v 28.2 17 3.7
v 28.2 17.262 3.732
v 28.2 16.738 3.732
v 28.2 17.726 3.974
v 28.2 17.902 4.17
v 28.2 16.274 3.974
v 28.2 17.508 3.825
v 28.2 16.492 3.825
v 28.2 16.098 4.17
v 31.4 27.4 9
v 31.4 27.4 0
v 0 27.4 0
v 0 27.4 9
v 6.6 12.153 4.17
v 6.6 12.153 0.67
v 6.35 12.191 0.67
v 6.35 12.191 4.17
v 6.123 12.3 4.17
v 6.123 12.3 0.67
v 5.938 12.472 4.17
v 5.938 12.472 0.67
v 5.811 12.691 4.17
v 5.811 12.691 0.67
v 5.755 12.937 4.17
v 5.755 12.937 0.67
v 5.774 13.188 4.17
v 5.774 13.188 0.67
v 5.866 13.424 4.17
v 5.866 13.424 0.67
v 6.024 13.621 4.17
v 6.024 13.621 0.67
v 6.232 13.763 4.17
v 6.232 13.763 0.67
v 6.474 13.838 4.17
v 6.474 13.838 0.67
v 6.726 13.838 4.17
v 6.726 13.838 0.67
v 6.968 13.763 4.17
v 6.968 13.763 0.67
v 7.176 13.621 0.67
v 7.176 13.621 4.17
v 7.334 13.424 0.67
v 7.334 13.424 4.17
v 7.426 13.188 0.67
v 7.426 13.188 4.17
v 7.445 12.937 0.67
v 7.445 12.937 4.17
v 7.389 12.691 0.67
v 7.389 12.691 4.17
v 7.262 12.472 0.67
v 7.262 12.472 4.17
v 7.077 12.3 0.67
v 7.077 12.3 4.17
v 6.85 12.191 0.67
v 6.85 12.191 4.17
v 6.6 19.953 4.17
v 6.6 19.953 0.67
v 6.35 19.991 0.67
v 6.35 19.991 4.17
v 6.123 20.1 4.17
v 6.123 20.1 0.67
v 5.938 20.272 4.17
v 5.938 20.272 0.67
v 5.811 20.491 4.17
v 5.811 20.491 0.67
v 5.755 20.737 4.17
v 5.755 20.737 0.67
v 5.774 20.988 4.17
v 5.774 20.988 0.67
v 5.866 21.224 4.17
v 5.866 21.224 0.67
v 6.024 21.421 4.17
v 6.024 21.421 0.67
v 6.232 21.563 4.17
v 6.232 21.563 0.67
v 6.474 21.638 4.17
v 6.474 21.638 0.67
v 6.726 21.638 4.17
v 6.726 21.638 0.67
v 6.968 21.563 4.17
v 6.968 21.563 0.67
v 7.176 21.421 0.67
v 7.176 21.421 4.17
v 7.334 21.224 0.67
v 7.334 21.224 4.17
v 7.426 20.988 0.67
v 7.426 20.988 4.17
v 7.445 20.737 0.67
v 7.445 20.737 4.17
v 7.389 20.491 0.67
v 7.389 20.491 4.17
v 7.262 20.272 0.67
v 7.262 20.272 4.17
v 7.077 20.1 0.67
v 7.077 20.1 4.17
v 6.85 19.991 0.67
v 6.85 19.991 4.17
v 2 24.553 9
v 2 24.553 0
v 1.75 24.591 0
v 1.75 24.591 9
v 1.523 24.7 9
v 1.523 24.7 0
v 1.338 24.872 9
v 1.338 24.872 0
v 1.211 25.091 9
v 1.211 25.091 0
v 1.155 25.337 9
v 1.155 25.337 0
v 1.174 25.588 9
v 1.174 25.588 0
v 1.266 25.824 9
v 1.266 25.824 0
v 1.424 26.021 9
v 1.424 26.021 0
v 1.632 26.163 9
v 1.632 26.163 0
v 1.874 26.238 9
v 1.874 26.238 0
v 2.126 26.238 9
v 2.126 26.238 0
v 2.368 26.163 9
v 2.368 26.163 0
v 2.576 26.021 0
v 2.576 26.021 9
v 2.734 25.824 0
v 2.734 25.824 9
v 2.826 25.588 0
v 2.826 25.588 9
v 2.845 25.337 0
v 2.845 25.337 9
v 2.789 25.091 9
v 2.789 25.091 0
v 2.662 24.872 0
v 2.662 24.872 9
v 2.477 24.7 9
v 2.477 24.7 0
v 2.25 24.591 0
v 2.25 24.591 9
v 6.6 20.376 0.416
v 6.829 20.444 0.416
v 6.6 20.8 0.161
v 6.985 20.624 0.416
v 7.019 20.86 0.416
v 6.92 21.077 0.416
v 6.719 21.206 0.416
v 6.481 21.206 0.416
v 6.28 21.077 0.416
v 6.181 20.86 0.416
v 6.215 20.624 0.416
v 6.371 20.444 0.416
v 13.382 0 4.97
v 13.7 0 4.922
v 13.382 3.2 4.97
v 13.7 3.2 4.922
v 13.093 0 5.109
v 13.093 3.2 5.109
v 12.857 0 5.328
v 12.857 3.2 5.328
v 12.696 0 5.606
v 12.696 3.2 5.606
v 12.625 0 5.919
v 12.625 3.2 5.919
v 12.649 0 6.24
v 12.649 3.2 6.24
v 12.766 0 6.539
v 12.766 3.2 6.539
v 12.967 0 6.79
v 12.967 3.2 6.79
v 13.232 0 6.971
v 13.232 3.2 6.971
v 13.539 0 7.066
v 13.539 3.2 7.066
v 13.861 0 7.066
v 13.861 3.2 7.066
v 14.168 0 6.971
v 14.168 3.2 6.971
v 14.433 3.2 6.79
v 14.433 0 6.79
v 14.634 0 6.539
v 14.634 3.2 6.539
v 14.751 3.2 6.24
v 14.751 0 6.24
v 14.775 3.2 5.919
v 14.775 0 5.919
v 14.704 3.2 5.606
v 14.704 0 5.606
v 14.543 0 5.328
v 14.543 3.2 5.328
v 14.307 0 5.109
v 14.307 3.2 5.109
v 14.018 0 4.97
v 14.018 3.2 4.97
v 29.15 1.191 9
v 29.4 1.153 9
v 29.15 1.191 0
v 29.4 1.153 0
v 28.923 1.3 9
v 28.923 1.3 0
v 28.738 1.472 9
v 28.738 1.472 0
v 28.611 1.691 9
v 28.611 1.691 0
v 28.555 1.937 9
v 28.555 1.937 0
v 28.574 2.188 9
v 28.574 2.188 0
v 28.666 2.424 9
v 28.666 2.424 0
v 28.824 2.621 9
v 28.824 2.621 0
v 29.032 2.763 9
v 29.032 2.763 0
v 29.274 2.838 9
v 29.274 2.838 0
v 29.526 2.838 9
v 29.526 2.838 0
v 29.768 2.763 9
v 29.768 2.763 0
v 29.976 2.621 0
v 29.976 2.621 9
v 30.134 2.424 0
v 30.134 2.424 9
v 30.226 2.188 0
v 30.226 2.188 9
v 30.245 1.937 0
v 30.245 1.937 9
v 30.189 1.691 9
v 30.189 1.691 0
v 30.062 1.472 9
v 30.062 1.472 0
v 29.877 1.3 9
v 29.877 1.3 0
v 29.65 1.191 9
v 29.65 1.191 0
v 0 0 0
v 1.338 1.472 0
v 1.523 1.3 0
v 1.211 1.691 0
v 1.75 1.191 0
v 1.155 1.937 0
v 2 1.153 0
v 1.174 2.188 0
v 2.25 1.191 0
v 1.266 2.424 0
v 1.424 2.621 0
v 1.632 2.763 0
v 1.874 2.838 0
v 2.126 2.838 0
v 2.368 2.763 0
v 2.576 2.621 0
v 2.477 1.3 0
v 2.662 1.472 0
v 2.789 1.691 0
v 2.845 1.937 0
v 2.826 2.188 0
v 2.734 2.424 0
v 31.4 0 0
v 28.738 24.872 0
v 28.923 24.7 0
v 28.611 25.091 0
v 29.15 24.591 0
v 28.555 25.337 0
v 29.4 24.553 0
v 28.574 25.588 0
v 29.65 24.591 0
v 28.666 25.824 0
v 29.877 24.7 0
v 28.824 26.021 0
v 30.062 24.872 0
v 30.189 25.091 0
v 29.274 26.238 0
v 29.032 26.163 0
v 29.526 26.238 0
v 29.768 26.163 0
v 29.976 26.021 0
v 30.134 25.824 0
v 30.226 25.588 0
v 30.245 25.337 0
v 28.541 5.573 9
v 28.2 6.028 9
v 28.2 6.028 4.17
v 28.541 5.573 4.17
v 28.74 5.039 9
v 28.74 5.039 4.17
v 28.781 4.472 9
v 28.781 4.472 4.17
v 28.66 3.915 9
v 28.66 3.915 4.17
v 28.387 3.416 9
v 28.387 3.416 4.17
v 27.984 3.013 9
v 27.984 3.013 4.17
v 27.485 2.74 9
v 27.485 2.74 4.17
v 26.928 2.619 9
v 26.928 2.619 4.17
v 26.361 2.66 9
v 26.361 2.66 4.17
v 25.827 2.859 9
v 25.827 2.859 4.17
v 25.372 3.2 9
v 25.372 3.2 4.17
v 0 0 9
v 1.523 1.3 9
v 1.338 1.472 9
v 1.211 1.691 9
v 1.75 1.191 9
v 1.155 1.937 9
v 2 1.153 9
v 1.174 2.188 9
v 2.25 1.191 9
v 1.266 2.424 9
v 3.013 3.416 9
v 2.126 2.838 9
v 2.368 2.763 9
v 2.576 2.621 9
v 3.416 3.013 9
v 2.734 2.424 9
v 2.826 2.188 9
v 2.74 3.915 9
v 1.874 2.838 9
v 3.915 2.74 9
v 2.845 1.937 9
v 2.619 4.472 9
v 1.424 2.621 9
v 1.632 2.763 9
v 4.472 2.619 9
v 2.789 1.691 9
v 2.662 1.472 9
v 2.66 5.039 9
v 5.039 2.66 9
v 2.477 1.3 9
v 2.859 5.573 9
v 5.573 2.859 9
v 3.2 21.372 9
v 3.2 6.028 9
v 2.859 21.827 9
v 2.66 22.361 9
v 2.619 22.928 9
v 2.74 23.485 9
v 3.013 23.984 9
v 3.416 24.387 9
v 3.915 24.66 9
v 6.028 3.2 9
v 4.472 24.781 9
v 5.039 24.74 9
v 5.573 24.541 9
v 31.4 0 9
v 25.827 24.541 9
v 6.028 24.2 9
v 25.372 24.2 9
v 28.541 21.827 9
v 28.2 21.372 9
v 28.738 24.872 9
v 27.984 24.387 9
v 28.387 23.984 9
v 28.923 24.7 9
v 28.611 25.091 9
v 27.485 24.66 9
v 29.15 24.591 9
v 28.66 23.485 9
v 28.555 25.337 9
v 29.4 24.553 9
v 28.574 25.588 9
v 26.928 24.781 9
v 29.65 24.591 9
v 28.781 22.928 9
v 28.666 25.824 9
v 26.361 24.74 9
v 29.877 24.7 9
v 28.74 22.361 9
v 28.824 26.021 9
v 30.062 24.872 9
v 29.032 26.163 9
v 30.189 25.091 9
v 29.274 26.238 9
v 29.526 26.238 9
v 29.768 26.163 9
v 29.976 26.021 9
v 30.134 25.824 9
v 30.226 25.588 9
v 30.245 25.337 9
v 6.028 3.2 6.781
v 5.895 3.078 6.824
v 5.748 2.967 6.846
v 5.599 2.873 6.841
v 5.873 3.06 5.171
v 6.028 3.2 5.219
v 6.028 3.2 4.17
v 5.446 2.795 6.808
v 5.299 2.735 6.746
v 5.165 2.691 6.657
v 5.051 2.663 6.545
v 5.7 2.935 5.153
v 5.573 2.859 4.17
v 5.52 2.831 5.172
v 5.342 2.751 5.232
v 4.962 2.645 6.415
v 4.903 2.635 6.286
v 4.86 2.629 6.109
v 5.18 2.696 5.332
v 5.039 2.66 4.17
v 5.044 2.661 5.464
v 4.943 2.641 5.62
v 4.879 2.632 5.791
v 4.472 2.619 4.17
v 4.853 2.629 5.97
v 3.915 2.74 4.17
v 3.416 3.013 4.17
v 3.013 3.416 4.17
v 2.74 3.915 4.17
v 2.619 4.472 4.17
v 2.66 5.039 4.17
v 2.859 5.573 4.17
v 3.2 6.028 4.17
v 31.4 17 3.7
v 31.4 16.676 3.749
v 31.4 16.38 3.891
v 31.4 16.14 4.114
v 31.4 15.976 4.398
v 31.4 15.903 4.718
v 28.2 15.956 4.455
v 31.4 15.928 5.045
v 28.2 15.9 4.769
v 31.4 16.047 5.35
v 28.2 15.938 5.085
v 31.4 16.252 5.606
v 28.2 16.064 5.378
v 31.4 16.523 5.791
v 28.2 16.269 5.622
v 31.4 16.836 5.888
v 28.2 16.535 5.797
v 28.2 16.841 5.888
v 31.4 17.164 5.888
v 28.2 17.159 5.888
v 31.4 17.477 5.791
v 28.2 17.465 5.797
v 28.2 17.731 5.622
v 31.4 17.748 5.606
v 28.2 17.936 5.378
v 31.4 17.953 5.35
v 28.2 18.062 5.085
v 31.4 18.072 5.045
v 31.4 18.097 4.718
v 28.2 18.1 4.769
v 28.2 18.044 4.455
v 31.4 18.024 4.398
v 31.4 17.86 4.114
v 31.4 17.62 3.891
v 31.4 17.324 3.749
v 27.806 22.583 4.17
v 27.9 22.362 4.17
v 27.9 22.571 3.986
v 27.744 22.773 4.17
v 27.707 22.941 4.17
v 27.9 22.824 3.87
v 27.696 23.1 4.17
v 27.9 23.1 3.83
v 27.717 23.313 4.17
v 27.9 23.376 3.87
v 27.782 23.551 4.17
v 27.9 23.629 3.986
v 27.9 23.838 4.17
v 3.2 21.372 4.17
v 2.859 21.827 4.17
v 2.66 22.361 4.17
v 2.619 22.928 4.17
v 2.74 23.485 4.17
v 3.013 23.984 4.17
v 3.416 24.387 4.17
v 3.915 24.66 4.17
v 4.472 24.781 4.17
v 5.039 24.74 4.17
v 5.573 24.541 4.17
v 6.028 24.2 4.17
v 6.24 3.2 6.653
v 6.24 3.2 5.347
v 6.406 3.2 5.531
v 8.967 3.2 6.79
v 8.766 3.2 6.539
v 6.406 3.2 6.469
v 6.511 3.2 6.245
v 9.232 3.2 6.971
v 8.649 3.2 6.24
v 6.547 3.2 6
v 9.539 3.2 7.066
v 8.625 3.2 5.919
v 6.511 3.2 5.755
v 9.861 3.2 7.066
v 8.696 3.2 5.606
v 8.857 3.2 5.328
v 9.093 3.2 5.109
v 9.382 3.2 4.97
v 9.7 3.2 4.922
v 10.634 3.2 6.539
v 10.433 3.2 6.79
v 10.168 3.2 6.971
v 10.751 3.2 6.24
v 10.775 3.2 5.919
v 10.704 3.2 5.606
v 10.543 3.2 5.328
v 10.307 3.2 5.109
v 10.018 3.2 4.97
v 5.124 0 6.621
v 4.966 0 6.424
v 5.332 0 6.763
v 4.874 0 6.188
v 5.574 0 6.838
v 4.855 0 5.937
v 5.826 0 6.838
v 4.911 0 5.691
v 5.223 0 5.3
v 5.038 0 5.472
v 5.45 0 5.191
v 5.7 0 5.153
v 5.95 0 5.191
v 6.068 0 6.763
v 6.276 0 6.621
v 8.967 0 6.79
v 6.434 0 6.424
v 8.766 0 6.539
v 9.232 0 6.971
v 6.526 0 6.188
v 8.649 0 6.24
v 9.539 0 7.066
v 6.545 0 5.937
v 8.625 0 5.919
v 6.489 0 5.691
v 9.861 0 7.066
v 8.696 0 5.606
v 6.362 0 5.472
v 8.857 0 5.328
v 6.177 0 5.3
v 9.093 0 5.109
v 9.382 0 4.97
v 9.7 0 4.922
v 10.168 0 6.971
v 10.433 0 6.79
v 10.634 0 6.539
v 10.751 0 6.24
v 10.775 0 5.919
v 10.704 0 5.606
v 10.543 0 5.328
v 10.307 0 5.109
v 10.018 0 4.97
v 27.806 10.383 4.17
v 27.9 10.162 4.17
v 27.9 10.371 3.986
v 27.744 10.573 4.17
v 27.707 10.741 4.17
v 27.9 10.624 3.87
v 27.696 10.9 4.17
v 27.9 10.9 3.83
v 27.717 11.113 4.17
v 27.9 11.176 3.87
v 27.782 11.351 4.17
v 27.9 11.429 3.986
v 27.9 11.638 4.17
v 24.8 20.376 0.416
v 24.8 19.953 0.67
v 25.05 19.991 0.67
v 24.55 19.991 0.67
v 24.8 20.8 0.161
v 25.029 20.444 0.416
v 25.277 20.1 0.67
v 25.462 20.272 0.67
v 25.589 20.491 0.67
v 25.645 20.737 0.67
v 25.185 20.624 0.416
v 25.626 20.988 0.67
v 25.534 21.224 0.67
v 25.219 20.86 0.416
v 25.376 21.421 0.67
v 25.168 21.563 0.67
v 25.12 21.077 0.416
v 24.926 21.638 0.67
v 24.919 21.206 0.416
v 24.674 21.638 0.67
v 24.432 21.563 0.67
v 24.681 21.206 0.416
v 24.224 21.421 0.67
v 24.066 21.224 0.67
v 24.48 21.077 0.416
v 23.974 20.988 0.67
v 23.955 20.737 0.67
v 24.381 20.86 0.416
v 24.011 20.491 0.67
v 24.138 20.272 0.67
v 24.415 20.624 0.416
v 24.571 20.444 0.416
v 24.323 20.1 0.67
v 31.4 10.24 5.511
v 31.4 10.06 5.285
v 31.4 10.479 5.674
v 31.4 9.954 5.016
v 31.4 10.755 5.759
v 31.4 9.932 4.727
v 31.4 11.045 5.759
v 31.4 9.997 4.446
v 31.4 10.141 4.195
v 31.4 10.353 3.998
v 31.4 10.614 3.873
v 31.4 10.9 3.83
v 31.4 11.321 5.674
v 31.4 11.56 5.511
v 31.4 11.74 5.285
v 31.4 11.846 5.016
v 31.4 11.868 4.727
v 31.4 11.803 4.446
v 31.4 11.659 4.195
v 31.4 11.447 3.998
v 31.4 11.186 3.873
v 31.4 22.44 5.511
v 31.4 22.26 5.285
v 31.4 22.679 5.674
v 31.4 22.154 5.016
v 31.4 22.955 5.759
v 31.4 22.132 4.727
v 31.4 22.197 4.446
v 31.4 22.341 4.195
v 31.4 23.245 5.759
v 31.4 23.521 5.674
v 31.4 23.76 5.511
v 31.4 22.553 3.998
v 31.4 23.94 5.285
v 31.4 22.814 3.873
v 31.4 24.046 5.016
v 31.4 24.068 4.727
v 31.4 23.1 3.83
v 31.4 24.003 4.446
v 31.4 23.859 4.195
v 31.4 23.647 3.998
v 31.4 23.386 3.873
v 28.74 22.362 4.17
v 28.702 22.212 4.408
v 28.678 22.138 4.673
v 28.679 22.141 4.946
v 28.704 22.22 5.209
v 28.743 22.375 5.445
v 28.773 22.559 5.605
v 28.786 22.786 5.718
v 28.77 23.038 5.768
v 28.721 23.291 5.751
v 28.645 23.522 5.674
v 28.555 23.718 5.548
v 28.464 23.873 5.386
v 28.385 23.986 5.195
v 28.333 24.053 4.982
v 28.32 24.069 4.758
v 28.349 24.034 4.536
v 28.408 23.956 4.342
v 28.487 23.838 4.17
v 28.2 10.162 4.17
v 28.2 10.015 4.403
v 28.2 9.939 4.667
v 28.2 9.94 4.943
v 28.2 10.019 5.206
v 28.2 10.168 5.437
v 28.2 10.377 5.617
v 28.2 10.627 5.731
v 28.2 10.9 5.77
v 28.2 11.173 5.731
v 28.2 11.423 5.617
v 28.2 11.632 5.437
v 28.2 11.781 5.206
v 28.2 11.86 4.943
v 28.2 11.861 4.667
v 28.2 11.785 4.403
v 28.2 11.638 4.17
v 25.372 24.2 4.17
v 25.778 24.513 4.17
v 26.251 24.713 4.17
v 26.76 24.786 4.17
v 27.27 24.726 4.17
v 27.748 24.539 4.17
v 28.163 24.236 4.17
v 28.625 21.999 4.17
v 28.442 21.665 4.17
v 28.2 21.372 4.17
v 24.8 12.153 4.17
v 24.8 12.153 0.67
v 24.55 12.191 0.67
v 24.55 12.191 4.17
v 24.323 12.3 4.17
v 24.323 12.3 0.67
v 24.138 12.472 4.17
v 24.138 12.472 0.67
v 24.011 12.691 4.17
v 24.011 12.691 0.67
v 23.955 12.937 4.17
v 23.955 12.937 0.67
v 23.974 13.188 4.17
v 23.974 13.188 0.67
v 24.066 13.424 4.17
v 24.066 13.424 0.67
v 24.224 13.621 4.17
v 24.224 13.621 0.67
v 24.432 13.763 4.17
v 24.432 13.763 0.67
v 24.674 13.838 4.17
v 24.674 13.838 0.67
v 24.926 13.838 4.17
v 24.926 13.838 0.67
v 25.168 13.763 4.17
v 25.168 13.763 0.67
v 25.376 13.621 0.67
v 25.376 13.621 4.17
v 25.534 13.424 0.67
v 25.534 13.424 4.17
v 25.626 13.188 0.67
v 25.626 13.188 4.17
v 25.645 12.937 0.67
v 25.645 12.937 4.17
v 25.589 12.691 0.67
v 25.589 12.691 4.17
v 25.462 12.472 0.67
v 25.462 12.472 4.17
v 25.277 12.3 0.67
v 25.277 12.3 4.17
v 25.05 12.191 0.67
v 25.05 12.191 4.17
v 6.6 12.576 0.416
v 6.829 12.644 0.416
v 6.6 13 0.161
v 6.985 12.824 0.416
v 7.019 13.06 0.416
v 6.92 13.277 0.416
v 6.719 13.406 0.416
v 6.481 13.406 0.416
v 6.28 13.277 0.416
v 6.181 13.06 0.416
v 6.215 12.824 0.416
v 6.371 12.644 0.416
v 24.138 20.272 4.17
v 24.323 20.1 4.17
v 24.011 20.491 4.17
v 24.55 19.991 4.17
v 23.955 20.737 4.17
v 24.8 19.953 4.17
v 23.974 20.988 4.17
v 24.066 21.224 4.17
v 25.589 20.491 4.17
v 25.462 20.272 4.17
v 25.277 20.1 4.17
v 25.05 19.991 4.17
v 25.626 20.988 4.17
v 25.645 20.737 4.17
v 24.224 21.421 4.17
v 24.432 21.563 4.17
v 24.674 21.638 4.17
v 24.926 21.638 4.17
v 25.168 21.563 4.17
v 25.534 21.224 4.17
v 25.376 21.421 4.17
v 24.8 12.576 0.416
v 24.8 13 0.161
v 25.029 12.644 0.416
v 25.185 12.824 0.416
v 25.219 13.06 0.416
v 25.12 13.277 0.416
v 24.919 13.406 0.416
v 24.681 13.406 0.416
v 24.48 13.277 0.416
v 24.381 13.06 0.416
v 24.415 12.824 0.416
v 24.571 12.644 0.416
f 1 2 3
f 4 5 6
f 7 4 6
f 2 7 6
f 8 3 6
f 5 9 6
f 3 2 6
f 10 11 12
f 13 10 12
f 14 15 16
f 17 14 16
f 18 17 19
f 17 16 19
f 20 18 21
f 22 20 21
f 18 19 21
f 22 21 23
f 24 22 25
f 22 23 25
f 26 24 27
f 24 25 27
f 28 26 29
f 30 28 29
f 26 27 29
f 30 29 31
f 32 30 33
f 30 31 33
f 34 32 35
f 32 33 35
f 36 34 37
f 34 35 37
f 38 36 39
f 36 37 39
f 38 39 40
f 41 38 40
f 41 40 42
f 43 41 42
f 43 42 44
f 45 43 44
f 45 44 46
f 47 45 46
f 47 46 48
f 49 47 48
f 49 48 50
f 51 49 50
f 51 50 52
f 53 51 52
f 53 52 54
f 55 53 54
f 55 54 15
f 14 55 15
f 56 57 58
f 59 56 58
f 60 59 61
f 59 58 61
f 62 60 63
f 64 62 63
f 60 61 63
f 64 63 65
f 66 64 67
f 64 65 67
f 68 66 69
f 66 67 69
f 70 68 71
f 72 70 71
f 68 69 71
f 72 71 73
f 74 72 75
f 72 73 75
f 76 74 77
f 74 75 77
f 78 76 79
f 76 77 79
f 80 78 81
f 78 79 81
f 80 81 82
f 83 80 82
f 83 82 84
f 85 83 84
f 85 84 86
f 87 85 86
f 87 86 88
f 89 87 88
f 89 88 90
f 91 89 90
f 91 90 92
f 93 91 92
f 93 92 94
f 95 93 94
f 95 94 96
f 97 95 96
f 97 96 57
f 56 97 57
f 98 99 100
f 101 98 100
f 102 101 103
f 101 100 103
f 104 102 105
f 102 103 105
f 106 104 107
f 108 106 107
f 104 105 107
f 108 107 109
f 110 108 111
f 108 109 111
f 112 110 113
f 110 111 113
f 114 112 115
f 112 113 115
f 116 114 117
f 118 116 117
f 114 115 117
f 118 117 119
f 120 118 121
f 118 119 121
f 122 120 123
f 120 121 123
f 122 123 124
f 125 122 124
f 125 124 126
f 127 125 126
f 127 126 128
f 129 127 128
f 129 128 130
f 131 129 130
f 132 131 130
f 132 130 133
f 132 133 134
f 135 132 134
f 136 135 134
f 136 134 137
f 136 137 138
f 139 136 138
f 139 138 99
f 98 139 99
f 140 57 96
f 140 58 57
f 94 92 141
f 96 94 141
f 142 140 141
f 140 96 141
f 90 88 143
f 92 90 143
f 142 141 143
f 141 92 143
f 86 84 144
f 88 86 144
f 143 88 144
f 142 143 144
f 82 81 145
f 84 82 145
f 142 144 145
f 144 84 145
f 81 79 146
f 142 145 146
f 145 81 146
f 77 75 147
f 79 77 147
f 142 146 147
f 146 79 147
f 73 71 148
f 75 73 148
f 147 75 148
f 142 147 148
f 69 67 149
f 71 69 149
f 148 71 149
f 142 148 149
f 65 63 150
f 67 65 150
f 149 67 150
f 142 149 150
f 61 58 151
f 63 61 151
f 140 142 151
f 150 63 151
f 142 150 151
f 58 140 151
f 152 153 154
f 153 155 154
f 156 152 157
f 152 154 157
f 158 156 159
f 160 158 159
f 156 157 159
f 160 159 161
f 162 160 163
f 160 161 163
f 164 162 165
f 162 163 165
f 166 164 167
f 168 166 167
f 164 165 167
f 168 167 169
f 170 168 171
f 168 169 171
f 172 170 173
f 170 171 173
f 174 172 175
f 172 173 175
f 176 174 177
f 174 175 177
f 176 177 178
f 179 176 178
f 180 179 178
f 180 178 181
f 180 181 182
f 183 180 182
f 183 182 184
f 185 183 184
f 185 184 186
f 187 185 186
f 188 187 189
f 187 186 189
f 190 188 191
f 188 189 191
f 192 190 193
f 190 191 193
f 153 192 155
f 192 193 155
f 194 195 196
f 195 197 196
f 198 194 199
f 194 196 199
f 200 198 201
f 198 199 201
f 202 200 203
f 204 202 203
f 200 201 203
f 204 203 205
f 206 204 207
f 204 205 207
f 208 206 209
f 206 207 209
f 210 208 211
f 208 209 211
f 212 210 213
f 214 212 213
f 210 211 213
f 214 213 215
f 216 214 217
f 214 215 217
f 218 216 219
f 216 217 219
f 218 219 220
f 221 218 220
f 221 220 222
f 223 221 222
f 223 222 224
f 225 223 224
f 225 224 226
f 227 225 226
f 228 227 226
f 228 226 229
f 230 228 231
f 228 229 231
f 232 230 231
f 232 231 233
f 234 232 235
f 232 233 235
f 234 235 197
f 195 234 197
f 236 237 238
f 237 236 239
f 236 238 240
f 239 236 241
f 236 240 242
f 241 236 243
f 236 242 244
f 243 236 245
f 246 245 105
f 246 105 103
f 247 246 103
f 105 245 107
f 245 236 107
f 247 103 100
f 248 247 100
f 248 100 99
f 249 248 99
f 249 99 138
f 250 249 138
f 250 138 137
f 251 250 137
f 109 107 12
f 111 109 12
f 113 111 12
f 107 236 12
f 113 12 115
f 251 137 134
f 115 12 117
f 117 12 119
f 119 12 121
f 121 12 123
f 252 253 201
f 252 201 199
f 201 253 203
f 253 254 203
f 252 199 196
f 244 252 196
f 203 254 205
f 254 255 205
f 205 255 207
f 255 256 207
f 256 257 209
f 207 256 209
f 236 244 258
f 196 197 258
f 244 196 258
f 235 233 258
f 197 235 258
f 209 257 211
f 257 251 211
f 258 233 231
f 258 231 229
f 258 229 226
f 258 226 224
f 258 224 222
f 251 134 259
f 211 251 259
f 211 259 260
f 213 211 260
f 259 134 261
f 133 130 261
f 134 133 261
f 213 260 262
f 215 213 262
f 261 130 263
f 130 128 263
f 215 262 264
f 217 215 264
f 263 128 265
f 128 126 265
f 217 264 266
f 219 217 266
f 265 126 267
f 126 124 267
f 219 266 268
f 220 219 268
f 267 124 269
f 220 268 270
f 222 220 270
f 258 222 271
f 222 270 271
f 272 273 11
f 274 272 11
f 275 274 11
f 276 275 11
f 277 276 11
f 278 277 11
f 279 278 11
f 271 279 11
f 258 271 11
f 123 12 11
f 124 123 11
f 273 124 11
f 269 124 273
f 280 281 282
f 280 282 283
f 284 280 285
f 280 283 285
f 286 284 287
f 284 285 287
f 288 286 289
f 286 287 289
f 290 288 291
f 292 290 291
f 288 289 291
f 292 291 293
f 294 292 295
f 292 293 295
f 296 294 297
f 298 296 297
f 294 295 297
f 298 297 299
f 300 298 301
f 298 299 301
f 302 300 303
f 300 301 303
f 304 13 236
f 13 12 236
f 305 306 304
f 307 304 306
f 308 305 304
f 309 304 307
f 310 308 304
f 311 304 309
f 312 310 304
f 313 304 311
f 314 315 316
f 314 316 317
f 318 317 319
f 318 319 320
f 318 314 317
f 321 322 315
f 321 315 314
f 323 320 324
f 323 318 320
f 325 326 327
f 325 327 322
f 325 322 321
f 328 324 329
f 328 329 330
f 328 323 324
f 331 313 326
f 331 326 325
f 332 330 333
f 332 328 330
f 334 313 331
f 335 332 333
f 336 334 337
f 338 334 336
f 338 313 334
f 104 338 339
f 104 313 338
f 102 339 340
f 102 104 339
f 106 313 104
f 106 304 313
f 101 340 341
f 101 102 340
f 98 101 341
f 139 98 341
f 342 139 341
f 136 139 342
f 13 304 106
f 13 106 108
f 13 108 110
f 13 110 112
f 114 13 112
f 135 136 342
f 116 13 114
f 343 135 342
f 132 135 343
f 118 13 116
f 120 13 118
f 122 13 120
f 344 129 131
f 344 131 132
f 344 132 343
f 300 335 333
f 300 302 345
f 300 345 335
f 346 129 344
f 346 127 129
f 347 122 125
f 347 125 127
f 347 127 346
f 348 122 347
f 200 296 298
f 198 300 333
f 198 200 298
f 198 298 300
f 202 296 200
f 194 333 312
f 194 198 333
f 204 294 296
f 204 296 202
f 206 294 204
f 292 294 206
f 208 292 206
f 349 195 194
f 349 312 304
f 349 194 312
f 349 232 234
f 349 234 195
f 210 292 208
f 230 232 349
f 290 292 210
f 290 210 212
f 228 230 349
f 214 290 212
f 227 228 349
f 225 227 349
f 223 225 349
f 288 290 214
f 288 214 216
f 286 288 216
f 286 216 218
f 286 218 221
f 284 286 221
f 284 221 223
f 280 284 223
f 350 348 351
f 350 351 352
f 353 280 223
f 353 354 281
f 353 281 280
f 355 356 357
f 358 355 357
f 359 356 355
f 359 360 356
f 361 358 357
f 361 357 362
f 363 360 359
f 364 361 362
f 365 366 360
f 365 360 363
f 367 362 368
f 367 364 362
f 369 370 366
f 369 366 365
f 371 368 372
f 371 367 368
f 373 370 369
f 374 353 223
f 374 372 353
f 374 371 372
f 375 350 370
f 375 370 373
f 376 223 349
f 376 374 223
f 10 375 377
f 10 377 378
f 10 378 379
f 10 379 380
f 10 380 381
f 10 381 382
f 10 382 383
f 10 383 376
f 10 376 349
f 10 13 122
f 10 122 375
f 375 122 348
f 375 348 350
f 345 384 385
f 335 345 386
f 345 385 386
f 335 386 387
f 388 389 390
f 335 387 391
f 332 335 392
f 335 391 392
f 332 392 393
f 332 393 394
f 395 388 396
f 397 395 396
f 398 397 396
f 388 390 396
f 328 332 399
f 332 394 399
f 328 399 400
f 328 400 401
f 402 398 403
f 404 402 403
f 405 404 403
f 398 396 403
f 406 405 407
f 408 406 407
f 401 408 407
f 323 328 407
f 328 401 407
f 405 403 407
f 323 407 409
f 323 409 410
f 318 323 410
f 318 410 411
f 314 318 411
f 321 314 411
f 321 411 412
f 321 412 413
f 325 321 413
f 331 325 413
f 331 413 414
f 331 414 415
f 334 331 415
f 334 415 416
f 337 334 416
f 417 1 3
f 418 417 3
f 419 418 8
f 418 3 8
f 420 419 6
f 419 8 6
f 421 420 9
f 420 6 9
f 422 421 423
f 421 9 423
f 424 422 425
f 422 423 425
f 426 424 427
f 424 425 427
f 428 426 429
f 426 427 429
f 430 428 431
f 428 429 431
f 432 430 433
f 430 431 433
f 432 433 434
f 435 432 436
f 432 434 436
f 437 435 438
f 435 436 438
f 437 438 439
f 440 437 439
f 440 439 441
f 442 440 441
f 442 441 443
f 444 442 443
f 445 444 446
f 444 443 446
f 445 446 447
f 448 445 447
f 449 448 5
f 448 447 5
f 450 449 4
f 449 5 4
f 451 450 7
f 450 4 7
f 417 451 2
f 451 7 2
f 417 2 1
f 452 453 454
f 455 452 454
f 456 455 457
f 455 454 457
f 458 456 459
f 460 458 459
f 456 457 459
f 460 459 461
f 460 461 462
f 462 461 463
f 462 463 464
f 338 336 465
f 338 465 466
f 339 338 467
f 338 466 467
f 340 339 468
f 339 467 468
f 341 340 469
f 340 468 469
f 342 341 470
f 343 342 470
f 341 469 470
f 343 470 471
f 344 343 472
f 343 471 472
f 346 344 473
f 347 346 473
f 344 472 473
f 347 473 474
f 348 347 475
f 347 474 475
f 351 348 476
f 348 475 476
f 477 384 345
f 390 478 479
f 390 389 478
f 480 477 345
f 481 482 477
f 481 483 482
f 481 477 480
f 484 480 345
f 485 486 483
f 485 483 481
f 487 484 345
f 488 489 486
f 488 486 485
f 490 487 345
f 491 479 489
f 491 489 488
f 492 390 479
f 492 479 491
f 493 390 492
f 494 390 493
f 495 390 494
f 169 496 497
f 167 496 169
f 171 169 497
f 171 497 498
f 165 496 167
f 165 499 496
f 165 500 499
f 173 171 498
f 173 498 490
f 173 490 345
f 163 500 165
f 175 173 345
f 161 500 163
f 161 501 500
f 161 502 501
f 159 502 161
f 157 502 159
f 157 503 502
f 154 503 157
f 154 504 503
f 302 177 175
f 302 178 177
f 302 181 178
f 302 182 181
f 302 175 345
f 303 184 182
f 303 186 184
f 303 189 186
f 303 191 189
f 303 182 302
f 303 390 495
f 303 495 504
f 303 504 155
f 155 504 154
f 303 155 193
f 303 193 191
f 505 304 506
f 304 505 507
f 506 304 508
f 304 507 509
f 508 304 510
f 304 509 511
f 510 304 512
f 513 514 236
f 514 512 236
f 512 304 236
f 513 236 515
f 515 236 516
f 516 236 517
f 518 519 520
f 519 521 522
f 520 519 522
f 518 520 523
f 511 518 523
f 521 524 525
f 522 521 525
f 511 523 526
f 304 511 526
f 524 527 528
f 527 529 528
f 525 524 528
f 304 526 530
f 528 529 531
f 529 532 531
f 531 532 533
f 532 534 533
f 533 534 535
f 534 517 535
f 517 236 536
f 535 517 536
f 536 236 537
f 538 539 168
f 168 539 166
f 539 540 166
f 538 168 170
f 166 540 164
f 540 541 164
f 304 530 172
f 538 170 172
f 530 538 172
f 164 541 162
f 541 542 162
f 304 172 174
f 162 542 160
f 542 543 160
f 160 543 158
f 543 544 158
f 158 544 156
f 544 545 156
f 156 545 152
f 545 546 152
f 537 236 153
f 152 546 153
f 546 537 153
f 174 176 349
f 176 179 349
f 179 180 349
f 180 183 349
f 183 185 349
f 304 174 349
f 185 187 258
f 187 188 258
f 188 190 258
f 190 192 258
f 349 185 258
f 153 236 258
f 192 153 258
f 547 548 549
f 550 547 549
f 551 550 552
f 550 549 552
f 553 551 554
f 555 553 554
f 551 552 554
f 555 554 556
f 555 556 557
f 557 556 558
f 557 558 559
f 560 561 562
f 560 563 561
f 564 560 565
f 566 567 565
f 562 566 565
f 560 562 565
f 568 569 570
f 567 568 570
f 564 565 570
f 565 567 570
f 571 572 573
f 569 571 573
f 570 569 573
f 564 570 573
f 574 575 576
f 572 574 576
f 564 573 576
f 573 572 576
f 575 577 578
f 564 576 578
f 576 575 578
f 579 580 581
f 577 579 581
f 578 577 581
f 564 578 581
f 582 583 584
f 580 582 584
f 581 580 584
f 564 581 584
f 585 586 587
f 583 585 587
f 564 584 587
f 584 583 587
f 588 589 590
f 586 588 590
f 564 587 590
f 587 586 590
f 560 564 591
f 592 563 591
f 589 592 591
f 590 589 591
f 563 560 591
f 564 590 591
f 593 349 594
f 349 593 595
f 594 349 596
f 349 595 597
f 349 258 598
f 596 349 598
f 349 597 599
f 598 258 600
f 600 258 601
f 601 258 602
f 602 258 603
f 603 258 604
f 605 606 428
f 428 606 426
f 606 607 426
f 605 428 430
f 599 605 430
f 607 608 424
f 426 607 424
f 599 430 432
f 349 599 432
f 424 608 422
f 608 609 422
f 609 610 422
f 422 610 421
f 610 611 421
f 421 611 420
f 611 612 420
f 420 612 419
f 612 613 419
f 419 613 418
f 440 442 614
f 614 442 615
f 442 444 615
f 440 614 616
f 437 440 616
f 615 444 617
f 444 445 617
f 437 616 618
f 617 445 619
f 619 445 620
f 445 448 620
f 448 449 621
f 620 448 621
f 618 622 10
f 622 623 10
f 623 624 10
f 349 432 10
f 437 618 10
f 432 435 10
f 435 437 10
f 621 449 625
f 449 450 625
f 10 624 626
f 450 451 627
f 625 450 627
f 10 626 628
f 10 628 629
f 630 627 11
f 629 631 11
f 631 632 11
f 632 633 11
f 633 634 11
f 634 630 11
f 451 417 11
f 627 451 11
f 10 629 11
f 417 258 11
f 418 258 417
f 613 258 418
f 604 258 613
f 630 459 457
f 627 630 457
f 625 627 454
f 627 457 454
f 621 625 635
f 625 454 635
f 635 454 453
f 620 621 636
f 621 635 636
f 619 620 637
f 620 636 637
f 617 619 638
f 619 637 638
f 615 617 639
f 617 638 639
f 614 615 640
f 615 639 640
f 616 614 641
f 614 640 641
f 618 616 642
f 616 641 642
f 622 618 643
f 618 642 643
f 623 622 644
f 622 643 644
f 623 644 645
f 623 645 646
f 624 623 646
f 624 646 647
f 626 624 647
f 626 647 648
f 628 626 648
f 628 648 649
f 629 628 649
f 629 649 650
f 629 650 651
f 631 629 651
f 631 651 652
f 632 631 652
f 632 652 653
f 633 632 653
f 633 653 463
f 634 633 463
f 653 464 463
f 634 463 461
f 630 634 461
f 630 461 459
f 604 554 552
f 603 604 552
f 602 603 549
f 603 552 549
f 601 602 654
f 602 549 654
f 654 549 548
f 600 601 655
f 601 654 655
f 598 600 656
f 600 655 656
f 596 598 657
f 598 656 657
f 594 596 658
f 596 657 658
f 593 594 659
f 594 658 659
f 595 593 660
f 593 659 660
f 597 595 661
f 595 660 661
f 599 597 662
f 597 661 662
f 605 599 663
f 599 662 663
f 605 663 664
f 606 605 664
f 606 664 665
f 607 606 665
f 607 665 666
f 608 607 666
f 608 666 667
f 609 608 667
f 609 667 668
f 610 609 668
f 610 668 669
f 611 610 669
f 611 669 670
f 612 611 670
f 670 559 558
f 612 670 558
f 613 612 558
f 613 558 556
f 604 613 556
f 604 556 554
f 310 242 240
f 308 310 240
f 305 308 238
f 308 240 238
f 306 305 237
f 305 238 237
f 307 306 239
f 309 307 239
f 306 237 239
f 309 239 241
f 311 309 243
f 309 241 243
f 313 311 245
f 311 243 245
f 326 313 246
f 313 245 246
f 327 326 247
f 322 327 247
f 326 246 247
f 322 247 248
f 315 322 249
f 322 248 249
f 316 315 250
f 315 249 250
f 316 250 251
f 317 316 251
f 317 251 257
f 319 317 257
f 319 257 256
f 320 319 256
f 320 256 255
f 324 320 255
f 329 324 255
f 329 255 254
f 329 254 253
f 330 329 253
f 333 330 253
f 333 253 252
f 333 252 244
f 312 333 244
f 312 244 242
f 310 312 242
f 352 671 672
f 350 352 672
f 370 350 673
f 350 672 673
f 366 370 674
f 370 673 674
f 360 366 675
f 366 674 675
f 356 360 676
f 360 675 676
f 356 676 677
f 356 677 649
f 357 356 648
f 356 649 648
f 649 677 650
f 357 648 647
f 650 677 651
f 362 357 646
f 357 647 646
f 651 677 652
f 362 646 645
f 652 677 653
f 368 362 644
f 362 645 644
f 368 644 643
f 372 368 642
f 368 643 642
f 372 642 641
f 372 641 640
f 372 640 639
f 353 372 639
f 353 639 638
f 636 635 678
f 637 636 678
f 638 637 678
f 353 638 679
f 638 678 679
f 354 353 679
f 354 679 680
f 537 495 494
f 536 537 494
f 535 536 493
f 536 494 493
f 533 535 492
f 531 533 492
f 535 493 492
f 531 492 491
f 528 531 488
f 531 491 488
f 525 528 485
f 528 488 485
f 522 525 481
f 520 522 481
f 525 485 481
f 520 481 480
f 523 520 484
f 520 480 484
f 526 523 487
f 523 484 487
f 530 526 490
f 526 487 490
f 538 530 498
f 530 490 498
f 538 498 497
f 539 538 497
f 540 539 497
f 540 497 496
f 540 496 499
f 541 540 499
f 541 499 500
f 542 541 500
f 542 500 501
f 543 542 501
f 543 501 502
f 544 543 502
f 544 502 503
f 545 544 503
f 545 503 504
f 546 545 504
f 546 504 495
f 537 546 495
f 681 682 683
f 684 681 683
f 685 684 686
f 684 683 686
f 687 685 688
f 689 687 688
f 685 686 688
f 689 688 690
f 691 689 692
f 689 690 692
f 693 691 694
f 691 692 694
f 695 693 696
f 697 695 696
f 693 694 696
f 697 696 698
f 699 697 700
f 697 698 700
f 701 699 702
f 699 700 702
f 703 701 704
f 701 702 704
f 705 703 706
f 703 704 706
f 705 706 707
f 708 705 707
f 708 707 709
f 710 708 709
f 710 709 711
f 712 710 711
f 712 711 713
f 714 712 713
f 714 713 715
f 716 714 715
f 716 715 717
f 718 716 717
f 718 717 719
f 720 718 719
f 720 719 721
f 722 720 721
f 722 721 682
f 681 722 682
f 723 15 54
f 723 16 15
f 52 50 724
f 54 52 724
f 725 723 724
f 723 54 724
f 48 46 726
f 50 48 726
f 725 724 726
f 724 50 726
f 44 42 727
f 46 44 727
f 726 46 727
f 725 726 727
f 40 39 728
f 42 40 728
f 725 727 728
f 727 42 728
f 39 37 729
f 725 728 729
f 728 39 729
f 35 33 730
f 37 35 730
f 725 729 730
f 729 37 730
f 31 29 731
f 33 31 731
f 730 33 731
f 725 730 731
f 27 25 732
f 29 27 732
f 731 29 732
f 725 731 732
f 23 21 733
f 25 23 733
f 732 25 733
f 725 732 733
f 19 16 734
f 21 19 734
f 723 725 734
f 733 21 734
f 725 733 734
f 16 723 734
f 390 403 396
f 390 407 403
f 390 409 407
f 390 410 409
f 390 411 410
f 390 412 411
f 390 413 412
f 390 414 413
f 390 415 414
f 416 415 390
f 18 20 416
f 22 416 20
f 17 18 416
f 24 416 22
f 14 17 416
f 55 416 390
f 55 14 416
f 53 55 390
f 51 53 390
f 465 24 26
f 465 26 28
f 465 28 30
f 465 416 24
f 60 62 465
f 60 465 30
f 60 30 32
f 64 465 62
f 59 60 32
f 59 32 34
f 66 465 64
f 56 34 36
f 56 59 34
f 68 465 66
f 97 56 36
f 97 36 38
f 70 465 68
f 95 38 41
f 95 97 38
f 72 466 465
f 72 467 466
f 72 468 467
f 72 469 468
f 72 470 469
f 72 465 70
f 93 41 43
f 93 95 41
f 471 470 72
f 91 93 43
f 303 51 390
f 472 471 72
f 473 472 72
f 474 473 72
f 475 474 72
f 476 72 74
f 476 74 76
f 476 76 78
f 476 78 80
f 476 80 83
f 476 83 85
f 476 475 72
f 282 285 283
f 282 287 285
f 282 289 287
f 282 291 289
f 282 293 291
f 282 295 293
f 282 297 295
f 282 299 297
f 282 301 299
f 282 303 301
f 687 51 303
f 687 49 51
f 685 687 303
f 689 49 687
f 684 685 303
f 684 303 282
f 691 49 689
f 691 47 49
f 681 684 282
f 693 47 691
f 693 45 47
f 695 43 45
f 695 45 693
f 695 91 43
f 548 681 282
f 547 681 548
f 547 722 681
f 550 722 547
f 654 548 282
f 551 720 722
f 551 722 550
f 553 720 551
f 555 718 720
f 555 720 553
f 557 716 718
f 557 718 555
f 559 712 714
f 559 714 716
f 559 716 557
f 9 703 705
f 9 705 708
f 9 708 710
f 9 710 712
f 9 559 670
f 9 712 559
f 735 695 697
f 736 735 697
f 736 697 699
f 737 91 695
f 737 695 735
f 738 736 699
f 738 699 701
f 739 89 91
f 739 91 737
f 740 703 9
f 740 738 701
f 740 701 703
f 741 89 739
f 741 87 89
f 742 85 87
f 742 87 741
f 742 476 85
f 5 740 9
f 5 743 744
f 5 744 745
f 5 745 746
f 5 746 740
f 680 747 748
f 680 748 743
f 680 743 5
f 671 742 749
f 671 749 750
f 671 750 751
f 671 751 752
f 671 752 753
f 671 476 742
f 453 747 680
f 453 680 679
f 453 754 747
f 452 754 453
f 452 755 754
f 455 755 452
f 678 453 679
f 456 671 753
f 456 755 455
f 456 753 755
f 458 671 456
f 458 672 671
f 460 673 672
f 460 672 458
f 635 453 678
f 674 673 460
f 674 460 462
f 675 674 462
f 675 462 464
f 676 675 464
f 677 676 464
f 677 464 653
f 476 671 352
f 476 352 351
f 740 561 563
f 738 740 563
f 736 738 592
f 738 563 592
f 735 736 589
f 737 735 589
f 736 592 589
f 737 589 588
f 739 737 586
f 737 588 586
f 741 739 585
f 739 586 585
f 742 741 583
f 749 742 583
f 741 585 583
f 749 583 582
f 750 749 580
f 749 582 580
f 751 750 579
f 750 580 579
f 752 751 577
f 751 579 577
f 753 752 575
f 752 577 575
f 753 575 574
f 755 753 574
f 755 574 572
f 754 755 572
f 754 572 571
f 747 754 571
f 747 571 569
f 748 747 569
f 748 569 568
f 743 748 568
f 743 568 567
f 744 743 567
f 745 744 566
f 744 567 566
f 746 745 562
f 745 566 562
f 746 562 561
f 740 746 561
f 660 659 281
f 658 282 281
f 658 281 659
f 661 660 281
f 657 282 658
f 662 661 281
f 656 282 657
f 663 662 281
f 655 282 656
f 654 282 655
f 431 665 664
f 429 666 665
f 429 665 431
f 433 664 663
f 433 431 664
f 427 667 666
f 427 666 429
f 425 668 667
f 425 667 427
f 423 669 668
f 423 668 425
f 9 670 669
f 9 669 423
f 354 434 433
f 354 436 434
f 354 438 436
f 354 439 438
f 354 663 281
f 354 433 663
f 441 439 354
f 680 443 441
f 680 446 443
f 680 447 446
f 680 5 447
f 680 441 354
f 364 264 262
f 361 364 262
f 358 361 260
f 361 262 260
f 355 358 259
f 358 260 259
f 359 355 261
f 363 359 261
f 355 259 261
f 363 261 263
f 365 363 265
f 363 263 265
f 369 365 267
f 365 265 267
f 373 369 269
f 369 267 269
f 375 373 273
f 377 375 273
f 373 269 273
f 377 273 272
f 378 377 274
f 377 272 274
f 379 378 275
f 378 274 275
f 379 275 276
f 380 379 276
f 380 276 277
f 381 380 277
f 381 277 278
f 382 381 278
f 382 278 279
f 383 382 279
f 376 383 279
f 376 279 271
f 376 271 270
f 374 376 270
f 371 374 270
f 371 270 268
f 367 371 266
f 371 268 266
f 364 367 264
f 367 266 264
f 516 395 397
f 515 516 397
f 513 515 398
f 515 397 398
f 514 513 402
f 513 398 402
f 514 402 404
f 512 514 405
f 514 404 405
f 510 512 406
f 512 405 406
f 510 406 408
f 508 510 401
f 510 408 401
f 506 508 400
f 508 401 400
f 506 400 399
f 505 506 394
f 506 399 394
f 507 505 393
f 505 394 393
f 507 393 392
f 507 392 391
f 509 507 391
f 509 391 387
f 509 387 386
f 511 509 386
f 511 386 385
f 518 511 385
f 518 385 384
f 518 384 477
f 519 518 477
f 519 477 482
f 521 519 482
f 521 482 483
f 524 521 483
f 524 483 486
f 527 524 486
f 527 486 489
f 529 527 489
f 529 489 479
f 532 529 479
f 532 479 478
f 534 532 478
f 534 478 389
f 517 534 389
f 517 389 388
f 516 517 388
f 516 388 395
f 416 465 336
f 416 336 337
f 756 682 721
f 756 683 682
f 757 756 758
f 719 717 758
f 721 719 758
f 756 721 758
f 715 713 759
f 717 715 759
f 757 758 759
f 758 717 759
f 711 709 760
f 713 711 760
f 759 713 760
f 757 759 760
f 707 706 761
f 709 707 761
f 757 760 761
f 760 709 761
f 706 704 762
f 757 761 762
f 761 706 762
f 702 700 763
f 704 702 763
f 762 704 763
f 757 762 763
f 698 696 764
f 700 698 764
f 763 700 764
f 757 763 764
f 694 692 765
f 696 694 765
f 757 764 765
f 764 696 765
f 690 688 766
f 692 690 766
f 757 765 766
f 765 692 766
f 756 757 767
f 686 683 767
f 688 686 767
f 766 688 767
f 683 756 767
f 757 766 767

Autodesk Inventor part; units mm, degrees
ref_plane "YZ Plane" through (0, 0, 0) normal (1, 0, 0) x (0, 1, 0)
ref_plane "XZ Plane" through (0, 0, 0) normal (0, 1, 0) x (-1, 0, 0)
ref_plane "XY Plane" through (0, 0, 0) normal (0, 0, 1) x (1, 0, 0)
sketch "Sketch1" plane through (0, 0, 0) normal (0, 0, 1) x (1, 0, 0)
  line L0 (0, 0) -> (31.4, 0)
  line L1 (31.4, 0) -> (31.4, 27.4)
  line L2 (31.4, 27.4) -> (0, 27.4)
  line L3 (0, 27.4) -> (0, 0)
  dimension "d0" = 31.4
  dimension "d1" = 27.4
extrude "Extrusion1" add sketch "Sketch1" along normal blind 4.17
sketch "Sketch2" plane through (0, 0, 4.17) normal (0, 0, 1) x (1, 0, 0)
  line L0 (0, 0) -> (0, 27.4) projected
  line L1 (31.4, 0) -> (0, 0) projected
  line L2 (31.4, 27.4) -> (31.4, 0) projected
  line L3 (0, 27.4) -> (31.4, 27.4) projected
  line L4 (3.2, 3.2) -> (28.2, 3.2)
  line L5 (28.2, 3.2) -> (28.2, 24.2)
  line L6 (28.2, 24.2) -> (3.2, 24.2)
  line L7 (3.2, 24.2) -> (3.2, 3.2)
  line L8 (3.2, 24.2) -> (4.6142, 22.7858)
  line L9 (28.2, 24.2) -> (26.7858, 22.7858)
  line L10 (28.2, 3.2) -> (26.7858, 4.6142)
  line L11 (3.2, 3.2) -> (4.6142, 4.6142)
  circle A0 centre (4.6142, 22.7858) radius 2
  circle A1 centre (26.7858, 22.7858) radius 2
  circle A2 centre (26.7858, 4.6142) radius 2
  circle A3 centre (4.6142, 4.6142) radius 2
  dimension "d11" = 4
  dimension "d12" = 4
  dimension "d13" = 4
  dimension "d14" = 4
  dimension "d4" = 3.2
  dimension "d5" = 3.2
  dimension "d6" = 3.2
  dimension "d8" = 3.2
  dimension "d9" = 45
  dimension "d10" = 45
extrude "Extrusion2" add sketch "Sketch2" along normal blind 4.83
sketch "Sketch3" plane through (0, 0, 9) normal (0, 0, 1) x (1, 0, 0)
  line L0 (0, 27.4) -> (31.4, 27.4) projected
  line L1 (0, 0) -> (0, 27.4) projected
  line L2 (31.4, 0) -> (0, 0) projected
  line L3 (31.4, 27.4) -> (31.4, 0) projected
  point P0 (2, 25.4)
  point P1 (29.4, 25.4)
  point P2 (29.4, 2)
  point P3 (2, 2)
  dimension "d17" = 2
  dimension "d18" = 2
  dimension "d19" = 2
  dimension "d20" = 2
  dimension "d21" = 2
  dimension "d22" = 2
  dimension "d23" = 2
  dimension "d24" = 2
hole "Hole1" at (2, 25.4, 9) at (29.4, 25.4, 9) at (29.4, 2, 9) at (2, 2, 9) direction (0, 0, -1) diameter 1.6942 end through all thread size "2-56 UNC" class "2B" standard "ANSI Unified Screw Threads"
sketch "Sketch6" plane through (31.4, 0, 0) normal (1, 0, 0) x (0, 0, -1)
  line L0 (0, 0) -> (0, 27.4) projected
  line L1 (0, 27.4) -> (-9, 27.4) projected
  point P0 (-4.8, 17)
  dimension "d50" = 4.8
  dimension "d51" = 10.4
hole "Hole4" at (31.4, 17, 4.8) direction (-1, 0, 0) diameter 2.2 depth 3.2
sketch "Sketch7" plane through (31.4, 0, 0) normal (1, 0, 0) x (0, 0, -1)
  circle A0 centre (-4.8, 17) radius 1.1 projected
  point P0 (-4.8, 23.1)
  point P1 (-4.8, 10.9)
  dimension "d59" = 6.1
  dimension "d60" = 6.1
hole "Hole5" at (31.4, 23.1, 4.8) at (31.4, 10.9, 4.8) direction (-1, 0, 0) diameter 1.9406 depth 3.5 tip angle 118 thread size "3-48 UNC" class "2B" standard "ANSI Unified Screw Threads"
sketch "Sketch10" plane through (0, 0, 4.17) normal (0, 0, 1) x (1, 0, 0)
  line L0 (0, 27.4) -> (31.4, 27.4) projected
  line L1 (6.6, 20.8) -> (24.8, 20.8) construction
  line L2 (24.8, 20.8) -> (24.8, 13) construction
  line L3 (24.8, 13) -> (6.6, 13) construction
  line L4 (6.6, 13) -> (6.6, 20.8) construction
  line L5 (0, 0) -> (0, 27.4) construction
  dimension "d170" = 6.6
  dimension "d171" = 6.6
  dimension "d172" = 7.8
  dimension "d173" = 18.2
hole "Hole8" at (6.6, 20.8, 4.17) at (6.6, 13, 4.17) at (24.8, 13, 4.17) at (24.8, 20.8, 4.17) direction (0, 0, -1) diameter 1.6942 depth 3.5 tip angle 118 thread size "2-56 UNC" class "2B" standard "ANSI Unified Screw Threads"
sketch "Sketch15" plane through (0, 0, 0) normal (0, -1, 0) x (1, 0, 0)
  line L0 (0, 0) -> (0, 9) construction
  line L1 (0, 6) -> (31.3856, 6) construction
  line L2 (0, 0) -> (31.4, 0) construction
  line L3 (31.4, 9) -> (0, 9) construction
  line L4 (5.7, 9) -> (5.7, 0) construction
  point P0 (9.7, 6)
  point P1 (13.7, 6)
  point P2 (5.7, 6)
  dimension "d133" = 6
  dimension "d136" = 5.7
  dimension "d137" = 4
  dimension "d138" = 8
hole "Hole13" at (9.7, 0, 6) at (13.7, 0, 6) direction (0, 1, 0) diameter 2.1565 depth 3.2 tip angle 118 thread size "4-40 UNC" class "2B" standard "ANSI Unified Screw Threads"
hole "Hole15" at (5.7, 0, 6) direction (0, 1, 0) diameter 1.6942 depth 3.2 tip angle 118 thread size "2-56 UNC" class "2B" standard "ANSI Unified Screw Threads"
equation "\"d12\" = d11"
equation "\"d13\" = d11"
equation "\"d14\" = d11"
equation "\"d5\" = d4"
equation "\"d6\" = d4"
equation "\"d8\" = d4"
equation "\"d10\" = d9"
equation "\"d18\" = d17"
equation "\"d19\" = d17"
equation "\"d20\" = d17"
equation "\"d21\" = d17"
equation "\"d22\" = d17"
equation "\"d23\" = d17"
equation "\"d24\" = d17"
equation "\"d60\" = d59"
properties part number "Mixer IQ Box ND20" material "Aluminum-6061"
